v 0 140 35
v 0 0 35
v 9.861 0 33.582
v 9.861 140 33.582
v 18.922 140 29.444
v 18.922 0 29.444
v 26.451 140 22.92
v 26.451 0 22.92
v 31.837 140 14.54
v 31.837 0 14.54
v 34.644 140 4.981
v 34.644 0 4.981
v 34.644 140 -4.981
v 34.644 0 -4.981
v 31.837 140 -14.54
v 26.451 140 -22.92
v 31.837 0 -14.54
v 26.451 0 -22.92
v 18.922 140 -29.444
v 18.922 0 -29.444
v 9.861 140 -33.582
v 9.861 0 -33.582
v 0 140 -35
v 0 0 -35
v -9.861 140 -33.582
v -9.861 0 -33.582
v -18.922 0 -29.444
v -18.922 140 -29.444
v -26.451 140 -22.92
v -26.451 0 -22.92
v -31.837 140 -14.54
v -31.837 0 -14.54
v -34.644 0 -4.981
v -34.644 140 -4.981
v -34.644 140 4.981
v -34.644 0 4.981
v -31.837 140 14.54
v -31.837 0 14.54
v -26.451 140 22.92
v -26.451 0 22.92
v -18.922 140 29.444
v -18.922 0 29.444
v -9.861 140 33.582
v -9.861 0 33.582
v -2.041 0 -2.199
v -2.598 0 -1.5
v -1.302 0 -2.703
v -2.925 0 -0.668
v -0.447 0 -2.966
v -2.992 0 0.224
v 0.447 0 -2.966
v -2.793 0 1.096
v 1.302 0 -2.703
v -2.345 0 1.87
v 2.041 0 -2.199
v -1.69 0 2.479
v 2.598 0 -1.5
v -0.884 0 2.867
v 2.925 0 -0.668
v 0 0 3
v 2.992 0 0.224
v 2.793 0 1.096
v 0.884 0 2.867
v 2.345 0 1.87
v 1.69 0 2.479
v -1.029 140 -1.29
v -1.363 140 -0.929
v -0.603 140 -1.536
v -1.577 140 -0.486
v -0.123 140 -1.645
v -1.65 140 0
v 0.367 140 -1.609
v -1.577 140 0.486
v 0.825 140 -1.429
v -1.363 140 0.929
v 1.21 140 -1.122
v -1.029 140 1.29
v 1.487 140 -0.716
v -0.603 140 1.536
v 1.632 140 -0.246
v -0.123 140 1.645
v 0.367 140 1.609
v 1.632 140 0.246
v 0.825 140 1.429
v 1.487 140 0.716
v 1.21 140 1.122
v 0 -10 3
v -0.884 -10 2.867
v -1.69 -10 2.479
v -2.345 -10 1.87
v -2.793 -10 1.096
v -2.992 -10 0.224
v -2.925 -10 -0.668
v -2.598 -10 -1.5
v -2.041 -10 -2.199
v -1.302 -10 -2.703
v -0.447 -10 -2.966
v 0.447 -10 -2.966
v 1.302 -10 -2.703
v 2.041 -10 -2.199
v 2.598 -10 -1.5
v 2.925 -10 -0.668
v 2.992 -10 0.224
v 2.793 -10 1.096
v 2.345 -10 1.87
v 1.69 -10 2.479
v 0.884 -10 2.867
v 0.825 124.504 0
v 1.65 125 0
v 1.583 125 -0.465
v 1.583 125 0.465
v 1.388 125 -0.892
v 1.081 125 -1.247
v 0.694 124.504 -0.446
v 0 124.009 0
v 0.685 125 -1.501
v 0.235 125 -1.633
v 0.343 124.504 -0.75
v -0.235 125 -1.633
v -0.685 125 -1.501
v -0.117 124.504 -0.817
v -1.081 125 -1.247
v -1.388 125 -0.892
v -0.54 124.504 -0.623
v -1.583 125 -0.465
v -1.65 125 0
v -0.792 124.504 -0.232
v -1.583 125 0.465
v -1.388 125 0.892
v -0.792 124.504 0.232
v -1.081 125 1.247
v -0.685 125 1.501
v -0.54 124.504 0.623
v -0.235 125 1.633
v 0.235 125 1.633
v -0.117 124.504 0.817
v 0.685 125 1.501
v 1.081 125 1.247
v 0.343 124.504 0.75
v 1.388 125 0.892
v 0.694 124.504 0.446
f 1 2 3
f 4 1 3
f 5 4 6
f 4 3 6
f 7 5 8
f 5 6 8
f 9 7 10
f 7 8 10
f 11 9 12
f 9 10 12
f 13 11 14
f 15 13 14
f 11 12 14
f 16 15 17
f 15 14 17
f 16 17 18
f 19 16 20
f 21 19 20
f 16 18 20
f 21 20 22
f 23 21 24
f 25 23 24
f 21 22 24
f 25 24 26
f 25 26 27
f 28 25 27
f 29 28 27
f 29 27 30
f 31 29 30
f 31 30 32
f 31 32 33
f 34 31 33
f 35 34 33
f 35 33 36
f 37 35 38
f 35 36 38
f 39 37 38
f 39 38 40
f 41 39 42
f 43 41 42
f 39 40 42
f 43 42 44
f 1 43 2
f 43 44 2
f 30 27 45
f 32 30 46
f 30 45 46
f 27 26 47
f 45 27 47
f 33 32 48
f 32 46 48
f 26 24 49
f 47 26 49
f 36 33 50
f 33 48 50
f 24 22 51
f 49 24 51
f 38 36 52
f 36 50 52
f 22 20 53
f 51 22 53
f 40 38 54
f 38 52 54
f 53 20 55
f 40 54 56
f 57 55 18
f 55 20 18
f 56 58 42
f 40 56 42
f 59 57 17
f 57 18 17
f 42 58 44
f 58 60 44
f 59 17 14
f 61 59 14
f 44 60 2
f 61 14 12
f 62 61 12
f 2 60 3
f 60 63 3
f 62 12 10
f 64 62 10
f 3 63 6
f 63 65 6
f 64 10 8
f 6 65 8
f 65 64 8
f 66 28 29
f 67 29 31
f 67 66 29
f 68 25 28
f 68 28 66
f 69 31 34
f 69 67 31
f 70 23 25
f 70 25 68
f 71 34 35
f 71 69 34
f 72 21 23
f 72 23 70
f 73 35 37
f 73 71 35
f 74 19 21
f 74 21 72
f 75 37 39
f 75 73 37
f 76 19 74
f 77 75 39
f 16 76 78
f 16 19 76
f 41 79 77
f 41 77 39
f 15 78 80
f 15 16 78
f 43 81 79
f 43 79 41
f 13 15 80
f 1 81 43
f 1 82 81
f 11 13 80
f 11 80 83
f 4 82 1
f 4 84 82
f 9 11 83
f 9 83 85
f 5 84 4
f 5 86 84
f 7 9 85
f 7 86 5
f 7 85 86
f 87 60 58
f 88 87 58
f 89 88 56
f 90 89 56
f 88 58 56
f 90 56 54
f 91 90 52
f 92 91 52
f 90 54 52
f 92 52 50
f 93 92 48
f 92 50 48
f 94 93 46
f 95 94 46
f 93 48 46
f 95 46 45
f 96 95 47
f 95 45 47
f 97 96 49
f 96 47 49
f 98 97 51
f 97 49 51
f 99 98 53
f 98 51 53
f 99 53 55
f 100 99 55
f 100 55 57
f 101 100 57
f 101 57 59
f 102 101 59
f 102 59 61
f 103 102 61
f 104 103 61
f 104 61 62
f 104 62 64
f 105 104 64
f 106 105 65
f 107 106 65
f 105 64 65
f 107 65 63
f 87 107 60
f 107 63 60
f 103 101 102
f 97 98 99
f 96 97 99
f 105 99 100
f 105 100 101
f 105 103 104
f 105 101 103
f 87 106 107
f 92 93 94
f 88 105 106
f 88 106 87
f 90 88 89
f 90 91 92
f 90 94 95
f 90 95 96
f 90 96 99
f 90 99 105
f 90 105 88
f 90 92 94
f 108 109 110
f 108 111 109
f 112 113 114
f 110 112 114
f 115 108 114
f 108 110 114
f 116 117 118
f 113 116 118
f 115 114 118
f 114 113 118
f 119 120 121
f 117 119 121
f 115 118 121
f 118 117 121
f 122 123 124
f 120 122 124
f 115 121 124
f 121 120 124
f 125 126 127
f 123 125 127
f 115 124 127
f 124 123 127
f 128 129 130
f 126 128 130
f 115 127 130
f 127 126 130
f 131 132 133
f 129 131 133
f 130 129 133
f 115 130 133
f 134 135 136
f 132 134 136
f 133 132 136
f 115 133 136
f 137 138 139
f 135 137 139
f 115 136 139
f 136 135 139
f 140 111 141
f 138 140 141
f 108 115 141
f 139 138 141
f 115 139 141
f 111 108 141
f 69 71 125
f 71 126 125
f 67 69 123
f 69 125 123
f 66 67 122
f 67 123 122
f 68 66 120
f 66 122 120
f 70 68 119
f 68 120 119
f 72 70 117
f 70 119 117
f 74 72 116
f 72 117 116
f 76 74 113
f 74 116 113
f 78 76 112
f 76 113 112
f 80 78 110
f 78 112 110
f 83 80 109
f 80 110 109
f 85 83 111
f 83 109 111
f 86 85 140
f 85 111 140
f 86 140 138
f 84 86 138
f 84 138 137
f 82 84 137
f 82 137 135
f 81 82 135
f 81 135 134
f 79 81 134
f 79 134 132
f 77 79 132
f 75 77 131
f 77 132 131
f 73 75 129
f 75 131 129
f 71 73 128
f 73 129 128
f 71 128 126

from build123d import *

# Parameters (mm, degrees)
SKIZZE1_R                       = 35
AUFSATZ_LINEAR_AUSTRAGEN2_DEPTH = 140
AU_ENGEWINDE_R                  = 3
AUFSATZ_LINEAR_AUSTRAGEN4_DEPTH = 10
KERNLOCH_F_R_M4X0_71_D          = 3.3
KERNLOCH_F_R_M4X0_71_DEPTH      = 15
KERNLOCH_F_R_M4X0_71_TIP        = 0.991420021


with BuildPart() as part:
    # Skizze1 → Aufsatz-Linear austragen2 (new body)
    with BuildSketch(Plane(origin=(0, 0, 0), x_dir=(1, 0, 0), z_dir=(0, 1, 0))):
        with Locations(Location((0, 0, 0), (0, 0, 270))):
            Circle(SKIZZE1_R)
    extrude(amount=AUFSATZ_LINEAR_AUSTRAGEN2_DEPTH)

    # Außengewinde → Aufsatz-Linear austragen4 (add)
    with BuildSketch(Plane.XZ):
        with Locations(Location((0, 0, 0), (0, 0, 90))):
            Circle(AU_ENGEWINDE_R)
    extrude(amount=AUFSATZ_LINEAR_AUSTRAGEN4_DEPTH)

    # Kernloch für M4x0.71
    with Locations(Plane(origin=(0, 140, 0), x_dir=(1, 0, 0), z_dir=(0, 1, 0))):
        with Locations((0, 0)):
            Hole(KERNLOCH_F_R_M4X0_71_D / 2, depth=KERNLOCH_F_R_M4X0_71_DEPTH)
            with Locations((0, 0, -(KERNLOCH_F_R_M4X0_71_DEPTH + KERNLOCH_F_R_M4X0_71_TIP / 2))):  # 118° drill point
                Cone(0, KERNLOCH_F_R_M4X0_71_D / 2, KERNLOCH_F_R_M4X0_71_TIP, mode=Mode.SUBTRACT)


solid = part.part
